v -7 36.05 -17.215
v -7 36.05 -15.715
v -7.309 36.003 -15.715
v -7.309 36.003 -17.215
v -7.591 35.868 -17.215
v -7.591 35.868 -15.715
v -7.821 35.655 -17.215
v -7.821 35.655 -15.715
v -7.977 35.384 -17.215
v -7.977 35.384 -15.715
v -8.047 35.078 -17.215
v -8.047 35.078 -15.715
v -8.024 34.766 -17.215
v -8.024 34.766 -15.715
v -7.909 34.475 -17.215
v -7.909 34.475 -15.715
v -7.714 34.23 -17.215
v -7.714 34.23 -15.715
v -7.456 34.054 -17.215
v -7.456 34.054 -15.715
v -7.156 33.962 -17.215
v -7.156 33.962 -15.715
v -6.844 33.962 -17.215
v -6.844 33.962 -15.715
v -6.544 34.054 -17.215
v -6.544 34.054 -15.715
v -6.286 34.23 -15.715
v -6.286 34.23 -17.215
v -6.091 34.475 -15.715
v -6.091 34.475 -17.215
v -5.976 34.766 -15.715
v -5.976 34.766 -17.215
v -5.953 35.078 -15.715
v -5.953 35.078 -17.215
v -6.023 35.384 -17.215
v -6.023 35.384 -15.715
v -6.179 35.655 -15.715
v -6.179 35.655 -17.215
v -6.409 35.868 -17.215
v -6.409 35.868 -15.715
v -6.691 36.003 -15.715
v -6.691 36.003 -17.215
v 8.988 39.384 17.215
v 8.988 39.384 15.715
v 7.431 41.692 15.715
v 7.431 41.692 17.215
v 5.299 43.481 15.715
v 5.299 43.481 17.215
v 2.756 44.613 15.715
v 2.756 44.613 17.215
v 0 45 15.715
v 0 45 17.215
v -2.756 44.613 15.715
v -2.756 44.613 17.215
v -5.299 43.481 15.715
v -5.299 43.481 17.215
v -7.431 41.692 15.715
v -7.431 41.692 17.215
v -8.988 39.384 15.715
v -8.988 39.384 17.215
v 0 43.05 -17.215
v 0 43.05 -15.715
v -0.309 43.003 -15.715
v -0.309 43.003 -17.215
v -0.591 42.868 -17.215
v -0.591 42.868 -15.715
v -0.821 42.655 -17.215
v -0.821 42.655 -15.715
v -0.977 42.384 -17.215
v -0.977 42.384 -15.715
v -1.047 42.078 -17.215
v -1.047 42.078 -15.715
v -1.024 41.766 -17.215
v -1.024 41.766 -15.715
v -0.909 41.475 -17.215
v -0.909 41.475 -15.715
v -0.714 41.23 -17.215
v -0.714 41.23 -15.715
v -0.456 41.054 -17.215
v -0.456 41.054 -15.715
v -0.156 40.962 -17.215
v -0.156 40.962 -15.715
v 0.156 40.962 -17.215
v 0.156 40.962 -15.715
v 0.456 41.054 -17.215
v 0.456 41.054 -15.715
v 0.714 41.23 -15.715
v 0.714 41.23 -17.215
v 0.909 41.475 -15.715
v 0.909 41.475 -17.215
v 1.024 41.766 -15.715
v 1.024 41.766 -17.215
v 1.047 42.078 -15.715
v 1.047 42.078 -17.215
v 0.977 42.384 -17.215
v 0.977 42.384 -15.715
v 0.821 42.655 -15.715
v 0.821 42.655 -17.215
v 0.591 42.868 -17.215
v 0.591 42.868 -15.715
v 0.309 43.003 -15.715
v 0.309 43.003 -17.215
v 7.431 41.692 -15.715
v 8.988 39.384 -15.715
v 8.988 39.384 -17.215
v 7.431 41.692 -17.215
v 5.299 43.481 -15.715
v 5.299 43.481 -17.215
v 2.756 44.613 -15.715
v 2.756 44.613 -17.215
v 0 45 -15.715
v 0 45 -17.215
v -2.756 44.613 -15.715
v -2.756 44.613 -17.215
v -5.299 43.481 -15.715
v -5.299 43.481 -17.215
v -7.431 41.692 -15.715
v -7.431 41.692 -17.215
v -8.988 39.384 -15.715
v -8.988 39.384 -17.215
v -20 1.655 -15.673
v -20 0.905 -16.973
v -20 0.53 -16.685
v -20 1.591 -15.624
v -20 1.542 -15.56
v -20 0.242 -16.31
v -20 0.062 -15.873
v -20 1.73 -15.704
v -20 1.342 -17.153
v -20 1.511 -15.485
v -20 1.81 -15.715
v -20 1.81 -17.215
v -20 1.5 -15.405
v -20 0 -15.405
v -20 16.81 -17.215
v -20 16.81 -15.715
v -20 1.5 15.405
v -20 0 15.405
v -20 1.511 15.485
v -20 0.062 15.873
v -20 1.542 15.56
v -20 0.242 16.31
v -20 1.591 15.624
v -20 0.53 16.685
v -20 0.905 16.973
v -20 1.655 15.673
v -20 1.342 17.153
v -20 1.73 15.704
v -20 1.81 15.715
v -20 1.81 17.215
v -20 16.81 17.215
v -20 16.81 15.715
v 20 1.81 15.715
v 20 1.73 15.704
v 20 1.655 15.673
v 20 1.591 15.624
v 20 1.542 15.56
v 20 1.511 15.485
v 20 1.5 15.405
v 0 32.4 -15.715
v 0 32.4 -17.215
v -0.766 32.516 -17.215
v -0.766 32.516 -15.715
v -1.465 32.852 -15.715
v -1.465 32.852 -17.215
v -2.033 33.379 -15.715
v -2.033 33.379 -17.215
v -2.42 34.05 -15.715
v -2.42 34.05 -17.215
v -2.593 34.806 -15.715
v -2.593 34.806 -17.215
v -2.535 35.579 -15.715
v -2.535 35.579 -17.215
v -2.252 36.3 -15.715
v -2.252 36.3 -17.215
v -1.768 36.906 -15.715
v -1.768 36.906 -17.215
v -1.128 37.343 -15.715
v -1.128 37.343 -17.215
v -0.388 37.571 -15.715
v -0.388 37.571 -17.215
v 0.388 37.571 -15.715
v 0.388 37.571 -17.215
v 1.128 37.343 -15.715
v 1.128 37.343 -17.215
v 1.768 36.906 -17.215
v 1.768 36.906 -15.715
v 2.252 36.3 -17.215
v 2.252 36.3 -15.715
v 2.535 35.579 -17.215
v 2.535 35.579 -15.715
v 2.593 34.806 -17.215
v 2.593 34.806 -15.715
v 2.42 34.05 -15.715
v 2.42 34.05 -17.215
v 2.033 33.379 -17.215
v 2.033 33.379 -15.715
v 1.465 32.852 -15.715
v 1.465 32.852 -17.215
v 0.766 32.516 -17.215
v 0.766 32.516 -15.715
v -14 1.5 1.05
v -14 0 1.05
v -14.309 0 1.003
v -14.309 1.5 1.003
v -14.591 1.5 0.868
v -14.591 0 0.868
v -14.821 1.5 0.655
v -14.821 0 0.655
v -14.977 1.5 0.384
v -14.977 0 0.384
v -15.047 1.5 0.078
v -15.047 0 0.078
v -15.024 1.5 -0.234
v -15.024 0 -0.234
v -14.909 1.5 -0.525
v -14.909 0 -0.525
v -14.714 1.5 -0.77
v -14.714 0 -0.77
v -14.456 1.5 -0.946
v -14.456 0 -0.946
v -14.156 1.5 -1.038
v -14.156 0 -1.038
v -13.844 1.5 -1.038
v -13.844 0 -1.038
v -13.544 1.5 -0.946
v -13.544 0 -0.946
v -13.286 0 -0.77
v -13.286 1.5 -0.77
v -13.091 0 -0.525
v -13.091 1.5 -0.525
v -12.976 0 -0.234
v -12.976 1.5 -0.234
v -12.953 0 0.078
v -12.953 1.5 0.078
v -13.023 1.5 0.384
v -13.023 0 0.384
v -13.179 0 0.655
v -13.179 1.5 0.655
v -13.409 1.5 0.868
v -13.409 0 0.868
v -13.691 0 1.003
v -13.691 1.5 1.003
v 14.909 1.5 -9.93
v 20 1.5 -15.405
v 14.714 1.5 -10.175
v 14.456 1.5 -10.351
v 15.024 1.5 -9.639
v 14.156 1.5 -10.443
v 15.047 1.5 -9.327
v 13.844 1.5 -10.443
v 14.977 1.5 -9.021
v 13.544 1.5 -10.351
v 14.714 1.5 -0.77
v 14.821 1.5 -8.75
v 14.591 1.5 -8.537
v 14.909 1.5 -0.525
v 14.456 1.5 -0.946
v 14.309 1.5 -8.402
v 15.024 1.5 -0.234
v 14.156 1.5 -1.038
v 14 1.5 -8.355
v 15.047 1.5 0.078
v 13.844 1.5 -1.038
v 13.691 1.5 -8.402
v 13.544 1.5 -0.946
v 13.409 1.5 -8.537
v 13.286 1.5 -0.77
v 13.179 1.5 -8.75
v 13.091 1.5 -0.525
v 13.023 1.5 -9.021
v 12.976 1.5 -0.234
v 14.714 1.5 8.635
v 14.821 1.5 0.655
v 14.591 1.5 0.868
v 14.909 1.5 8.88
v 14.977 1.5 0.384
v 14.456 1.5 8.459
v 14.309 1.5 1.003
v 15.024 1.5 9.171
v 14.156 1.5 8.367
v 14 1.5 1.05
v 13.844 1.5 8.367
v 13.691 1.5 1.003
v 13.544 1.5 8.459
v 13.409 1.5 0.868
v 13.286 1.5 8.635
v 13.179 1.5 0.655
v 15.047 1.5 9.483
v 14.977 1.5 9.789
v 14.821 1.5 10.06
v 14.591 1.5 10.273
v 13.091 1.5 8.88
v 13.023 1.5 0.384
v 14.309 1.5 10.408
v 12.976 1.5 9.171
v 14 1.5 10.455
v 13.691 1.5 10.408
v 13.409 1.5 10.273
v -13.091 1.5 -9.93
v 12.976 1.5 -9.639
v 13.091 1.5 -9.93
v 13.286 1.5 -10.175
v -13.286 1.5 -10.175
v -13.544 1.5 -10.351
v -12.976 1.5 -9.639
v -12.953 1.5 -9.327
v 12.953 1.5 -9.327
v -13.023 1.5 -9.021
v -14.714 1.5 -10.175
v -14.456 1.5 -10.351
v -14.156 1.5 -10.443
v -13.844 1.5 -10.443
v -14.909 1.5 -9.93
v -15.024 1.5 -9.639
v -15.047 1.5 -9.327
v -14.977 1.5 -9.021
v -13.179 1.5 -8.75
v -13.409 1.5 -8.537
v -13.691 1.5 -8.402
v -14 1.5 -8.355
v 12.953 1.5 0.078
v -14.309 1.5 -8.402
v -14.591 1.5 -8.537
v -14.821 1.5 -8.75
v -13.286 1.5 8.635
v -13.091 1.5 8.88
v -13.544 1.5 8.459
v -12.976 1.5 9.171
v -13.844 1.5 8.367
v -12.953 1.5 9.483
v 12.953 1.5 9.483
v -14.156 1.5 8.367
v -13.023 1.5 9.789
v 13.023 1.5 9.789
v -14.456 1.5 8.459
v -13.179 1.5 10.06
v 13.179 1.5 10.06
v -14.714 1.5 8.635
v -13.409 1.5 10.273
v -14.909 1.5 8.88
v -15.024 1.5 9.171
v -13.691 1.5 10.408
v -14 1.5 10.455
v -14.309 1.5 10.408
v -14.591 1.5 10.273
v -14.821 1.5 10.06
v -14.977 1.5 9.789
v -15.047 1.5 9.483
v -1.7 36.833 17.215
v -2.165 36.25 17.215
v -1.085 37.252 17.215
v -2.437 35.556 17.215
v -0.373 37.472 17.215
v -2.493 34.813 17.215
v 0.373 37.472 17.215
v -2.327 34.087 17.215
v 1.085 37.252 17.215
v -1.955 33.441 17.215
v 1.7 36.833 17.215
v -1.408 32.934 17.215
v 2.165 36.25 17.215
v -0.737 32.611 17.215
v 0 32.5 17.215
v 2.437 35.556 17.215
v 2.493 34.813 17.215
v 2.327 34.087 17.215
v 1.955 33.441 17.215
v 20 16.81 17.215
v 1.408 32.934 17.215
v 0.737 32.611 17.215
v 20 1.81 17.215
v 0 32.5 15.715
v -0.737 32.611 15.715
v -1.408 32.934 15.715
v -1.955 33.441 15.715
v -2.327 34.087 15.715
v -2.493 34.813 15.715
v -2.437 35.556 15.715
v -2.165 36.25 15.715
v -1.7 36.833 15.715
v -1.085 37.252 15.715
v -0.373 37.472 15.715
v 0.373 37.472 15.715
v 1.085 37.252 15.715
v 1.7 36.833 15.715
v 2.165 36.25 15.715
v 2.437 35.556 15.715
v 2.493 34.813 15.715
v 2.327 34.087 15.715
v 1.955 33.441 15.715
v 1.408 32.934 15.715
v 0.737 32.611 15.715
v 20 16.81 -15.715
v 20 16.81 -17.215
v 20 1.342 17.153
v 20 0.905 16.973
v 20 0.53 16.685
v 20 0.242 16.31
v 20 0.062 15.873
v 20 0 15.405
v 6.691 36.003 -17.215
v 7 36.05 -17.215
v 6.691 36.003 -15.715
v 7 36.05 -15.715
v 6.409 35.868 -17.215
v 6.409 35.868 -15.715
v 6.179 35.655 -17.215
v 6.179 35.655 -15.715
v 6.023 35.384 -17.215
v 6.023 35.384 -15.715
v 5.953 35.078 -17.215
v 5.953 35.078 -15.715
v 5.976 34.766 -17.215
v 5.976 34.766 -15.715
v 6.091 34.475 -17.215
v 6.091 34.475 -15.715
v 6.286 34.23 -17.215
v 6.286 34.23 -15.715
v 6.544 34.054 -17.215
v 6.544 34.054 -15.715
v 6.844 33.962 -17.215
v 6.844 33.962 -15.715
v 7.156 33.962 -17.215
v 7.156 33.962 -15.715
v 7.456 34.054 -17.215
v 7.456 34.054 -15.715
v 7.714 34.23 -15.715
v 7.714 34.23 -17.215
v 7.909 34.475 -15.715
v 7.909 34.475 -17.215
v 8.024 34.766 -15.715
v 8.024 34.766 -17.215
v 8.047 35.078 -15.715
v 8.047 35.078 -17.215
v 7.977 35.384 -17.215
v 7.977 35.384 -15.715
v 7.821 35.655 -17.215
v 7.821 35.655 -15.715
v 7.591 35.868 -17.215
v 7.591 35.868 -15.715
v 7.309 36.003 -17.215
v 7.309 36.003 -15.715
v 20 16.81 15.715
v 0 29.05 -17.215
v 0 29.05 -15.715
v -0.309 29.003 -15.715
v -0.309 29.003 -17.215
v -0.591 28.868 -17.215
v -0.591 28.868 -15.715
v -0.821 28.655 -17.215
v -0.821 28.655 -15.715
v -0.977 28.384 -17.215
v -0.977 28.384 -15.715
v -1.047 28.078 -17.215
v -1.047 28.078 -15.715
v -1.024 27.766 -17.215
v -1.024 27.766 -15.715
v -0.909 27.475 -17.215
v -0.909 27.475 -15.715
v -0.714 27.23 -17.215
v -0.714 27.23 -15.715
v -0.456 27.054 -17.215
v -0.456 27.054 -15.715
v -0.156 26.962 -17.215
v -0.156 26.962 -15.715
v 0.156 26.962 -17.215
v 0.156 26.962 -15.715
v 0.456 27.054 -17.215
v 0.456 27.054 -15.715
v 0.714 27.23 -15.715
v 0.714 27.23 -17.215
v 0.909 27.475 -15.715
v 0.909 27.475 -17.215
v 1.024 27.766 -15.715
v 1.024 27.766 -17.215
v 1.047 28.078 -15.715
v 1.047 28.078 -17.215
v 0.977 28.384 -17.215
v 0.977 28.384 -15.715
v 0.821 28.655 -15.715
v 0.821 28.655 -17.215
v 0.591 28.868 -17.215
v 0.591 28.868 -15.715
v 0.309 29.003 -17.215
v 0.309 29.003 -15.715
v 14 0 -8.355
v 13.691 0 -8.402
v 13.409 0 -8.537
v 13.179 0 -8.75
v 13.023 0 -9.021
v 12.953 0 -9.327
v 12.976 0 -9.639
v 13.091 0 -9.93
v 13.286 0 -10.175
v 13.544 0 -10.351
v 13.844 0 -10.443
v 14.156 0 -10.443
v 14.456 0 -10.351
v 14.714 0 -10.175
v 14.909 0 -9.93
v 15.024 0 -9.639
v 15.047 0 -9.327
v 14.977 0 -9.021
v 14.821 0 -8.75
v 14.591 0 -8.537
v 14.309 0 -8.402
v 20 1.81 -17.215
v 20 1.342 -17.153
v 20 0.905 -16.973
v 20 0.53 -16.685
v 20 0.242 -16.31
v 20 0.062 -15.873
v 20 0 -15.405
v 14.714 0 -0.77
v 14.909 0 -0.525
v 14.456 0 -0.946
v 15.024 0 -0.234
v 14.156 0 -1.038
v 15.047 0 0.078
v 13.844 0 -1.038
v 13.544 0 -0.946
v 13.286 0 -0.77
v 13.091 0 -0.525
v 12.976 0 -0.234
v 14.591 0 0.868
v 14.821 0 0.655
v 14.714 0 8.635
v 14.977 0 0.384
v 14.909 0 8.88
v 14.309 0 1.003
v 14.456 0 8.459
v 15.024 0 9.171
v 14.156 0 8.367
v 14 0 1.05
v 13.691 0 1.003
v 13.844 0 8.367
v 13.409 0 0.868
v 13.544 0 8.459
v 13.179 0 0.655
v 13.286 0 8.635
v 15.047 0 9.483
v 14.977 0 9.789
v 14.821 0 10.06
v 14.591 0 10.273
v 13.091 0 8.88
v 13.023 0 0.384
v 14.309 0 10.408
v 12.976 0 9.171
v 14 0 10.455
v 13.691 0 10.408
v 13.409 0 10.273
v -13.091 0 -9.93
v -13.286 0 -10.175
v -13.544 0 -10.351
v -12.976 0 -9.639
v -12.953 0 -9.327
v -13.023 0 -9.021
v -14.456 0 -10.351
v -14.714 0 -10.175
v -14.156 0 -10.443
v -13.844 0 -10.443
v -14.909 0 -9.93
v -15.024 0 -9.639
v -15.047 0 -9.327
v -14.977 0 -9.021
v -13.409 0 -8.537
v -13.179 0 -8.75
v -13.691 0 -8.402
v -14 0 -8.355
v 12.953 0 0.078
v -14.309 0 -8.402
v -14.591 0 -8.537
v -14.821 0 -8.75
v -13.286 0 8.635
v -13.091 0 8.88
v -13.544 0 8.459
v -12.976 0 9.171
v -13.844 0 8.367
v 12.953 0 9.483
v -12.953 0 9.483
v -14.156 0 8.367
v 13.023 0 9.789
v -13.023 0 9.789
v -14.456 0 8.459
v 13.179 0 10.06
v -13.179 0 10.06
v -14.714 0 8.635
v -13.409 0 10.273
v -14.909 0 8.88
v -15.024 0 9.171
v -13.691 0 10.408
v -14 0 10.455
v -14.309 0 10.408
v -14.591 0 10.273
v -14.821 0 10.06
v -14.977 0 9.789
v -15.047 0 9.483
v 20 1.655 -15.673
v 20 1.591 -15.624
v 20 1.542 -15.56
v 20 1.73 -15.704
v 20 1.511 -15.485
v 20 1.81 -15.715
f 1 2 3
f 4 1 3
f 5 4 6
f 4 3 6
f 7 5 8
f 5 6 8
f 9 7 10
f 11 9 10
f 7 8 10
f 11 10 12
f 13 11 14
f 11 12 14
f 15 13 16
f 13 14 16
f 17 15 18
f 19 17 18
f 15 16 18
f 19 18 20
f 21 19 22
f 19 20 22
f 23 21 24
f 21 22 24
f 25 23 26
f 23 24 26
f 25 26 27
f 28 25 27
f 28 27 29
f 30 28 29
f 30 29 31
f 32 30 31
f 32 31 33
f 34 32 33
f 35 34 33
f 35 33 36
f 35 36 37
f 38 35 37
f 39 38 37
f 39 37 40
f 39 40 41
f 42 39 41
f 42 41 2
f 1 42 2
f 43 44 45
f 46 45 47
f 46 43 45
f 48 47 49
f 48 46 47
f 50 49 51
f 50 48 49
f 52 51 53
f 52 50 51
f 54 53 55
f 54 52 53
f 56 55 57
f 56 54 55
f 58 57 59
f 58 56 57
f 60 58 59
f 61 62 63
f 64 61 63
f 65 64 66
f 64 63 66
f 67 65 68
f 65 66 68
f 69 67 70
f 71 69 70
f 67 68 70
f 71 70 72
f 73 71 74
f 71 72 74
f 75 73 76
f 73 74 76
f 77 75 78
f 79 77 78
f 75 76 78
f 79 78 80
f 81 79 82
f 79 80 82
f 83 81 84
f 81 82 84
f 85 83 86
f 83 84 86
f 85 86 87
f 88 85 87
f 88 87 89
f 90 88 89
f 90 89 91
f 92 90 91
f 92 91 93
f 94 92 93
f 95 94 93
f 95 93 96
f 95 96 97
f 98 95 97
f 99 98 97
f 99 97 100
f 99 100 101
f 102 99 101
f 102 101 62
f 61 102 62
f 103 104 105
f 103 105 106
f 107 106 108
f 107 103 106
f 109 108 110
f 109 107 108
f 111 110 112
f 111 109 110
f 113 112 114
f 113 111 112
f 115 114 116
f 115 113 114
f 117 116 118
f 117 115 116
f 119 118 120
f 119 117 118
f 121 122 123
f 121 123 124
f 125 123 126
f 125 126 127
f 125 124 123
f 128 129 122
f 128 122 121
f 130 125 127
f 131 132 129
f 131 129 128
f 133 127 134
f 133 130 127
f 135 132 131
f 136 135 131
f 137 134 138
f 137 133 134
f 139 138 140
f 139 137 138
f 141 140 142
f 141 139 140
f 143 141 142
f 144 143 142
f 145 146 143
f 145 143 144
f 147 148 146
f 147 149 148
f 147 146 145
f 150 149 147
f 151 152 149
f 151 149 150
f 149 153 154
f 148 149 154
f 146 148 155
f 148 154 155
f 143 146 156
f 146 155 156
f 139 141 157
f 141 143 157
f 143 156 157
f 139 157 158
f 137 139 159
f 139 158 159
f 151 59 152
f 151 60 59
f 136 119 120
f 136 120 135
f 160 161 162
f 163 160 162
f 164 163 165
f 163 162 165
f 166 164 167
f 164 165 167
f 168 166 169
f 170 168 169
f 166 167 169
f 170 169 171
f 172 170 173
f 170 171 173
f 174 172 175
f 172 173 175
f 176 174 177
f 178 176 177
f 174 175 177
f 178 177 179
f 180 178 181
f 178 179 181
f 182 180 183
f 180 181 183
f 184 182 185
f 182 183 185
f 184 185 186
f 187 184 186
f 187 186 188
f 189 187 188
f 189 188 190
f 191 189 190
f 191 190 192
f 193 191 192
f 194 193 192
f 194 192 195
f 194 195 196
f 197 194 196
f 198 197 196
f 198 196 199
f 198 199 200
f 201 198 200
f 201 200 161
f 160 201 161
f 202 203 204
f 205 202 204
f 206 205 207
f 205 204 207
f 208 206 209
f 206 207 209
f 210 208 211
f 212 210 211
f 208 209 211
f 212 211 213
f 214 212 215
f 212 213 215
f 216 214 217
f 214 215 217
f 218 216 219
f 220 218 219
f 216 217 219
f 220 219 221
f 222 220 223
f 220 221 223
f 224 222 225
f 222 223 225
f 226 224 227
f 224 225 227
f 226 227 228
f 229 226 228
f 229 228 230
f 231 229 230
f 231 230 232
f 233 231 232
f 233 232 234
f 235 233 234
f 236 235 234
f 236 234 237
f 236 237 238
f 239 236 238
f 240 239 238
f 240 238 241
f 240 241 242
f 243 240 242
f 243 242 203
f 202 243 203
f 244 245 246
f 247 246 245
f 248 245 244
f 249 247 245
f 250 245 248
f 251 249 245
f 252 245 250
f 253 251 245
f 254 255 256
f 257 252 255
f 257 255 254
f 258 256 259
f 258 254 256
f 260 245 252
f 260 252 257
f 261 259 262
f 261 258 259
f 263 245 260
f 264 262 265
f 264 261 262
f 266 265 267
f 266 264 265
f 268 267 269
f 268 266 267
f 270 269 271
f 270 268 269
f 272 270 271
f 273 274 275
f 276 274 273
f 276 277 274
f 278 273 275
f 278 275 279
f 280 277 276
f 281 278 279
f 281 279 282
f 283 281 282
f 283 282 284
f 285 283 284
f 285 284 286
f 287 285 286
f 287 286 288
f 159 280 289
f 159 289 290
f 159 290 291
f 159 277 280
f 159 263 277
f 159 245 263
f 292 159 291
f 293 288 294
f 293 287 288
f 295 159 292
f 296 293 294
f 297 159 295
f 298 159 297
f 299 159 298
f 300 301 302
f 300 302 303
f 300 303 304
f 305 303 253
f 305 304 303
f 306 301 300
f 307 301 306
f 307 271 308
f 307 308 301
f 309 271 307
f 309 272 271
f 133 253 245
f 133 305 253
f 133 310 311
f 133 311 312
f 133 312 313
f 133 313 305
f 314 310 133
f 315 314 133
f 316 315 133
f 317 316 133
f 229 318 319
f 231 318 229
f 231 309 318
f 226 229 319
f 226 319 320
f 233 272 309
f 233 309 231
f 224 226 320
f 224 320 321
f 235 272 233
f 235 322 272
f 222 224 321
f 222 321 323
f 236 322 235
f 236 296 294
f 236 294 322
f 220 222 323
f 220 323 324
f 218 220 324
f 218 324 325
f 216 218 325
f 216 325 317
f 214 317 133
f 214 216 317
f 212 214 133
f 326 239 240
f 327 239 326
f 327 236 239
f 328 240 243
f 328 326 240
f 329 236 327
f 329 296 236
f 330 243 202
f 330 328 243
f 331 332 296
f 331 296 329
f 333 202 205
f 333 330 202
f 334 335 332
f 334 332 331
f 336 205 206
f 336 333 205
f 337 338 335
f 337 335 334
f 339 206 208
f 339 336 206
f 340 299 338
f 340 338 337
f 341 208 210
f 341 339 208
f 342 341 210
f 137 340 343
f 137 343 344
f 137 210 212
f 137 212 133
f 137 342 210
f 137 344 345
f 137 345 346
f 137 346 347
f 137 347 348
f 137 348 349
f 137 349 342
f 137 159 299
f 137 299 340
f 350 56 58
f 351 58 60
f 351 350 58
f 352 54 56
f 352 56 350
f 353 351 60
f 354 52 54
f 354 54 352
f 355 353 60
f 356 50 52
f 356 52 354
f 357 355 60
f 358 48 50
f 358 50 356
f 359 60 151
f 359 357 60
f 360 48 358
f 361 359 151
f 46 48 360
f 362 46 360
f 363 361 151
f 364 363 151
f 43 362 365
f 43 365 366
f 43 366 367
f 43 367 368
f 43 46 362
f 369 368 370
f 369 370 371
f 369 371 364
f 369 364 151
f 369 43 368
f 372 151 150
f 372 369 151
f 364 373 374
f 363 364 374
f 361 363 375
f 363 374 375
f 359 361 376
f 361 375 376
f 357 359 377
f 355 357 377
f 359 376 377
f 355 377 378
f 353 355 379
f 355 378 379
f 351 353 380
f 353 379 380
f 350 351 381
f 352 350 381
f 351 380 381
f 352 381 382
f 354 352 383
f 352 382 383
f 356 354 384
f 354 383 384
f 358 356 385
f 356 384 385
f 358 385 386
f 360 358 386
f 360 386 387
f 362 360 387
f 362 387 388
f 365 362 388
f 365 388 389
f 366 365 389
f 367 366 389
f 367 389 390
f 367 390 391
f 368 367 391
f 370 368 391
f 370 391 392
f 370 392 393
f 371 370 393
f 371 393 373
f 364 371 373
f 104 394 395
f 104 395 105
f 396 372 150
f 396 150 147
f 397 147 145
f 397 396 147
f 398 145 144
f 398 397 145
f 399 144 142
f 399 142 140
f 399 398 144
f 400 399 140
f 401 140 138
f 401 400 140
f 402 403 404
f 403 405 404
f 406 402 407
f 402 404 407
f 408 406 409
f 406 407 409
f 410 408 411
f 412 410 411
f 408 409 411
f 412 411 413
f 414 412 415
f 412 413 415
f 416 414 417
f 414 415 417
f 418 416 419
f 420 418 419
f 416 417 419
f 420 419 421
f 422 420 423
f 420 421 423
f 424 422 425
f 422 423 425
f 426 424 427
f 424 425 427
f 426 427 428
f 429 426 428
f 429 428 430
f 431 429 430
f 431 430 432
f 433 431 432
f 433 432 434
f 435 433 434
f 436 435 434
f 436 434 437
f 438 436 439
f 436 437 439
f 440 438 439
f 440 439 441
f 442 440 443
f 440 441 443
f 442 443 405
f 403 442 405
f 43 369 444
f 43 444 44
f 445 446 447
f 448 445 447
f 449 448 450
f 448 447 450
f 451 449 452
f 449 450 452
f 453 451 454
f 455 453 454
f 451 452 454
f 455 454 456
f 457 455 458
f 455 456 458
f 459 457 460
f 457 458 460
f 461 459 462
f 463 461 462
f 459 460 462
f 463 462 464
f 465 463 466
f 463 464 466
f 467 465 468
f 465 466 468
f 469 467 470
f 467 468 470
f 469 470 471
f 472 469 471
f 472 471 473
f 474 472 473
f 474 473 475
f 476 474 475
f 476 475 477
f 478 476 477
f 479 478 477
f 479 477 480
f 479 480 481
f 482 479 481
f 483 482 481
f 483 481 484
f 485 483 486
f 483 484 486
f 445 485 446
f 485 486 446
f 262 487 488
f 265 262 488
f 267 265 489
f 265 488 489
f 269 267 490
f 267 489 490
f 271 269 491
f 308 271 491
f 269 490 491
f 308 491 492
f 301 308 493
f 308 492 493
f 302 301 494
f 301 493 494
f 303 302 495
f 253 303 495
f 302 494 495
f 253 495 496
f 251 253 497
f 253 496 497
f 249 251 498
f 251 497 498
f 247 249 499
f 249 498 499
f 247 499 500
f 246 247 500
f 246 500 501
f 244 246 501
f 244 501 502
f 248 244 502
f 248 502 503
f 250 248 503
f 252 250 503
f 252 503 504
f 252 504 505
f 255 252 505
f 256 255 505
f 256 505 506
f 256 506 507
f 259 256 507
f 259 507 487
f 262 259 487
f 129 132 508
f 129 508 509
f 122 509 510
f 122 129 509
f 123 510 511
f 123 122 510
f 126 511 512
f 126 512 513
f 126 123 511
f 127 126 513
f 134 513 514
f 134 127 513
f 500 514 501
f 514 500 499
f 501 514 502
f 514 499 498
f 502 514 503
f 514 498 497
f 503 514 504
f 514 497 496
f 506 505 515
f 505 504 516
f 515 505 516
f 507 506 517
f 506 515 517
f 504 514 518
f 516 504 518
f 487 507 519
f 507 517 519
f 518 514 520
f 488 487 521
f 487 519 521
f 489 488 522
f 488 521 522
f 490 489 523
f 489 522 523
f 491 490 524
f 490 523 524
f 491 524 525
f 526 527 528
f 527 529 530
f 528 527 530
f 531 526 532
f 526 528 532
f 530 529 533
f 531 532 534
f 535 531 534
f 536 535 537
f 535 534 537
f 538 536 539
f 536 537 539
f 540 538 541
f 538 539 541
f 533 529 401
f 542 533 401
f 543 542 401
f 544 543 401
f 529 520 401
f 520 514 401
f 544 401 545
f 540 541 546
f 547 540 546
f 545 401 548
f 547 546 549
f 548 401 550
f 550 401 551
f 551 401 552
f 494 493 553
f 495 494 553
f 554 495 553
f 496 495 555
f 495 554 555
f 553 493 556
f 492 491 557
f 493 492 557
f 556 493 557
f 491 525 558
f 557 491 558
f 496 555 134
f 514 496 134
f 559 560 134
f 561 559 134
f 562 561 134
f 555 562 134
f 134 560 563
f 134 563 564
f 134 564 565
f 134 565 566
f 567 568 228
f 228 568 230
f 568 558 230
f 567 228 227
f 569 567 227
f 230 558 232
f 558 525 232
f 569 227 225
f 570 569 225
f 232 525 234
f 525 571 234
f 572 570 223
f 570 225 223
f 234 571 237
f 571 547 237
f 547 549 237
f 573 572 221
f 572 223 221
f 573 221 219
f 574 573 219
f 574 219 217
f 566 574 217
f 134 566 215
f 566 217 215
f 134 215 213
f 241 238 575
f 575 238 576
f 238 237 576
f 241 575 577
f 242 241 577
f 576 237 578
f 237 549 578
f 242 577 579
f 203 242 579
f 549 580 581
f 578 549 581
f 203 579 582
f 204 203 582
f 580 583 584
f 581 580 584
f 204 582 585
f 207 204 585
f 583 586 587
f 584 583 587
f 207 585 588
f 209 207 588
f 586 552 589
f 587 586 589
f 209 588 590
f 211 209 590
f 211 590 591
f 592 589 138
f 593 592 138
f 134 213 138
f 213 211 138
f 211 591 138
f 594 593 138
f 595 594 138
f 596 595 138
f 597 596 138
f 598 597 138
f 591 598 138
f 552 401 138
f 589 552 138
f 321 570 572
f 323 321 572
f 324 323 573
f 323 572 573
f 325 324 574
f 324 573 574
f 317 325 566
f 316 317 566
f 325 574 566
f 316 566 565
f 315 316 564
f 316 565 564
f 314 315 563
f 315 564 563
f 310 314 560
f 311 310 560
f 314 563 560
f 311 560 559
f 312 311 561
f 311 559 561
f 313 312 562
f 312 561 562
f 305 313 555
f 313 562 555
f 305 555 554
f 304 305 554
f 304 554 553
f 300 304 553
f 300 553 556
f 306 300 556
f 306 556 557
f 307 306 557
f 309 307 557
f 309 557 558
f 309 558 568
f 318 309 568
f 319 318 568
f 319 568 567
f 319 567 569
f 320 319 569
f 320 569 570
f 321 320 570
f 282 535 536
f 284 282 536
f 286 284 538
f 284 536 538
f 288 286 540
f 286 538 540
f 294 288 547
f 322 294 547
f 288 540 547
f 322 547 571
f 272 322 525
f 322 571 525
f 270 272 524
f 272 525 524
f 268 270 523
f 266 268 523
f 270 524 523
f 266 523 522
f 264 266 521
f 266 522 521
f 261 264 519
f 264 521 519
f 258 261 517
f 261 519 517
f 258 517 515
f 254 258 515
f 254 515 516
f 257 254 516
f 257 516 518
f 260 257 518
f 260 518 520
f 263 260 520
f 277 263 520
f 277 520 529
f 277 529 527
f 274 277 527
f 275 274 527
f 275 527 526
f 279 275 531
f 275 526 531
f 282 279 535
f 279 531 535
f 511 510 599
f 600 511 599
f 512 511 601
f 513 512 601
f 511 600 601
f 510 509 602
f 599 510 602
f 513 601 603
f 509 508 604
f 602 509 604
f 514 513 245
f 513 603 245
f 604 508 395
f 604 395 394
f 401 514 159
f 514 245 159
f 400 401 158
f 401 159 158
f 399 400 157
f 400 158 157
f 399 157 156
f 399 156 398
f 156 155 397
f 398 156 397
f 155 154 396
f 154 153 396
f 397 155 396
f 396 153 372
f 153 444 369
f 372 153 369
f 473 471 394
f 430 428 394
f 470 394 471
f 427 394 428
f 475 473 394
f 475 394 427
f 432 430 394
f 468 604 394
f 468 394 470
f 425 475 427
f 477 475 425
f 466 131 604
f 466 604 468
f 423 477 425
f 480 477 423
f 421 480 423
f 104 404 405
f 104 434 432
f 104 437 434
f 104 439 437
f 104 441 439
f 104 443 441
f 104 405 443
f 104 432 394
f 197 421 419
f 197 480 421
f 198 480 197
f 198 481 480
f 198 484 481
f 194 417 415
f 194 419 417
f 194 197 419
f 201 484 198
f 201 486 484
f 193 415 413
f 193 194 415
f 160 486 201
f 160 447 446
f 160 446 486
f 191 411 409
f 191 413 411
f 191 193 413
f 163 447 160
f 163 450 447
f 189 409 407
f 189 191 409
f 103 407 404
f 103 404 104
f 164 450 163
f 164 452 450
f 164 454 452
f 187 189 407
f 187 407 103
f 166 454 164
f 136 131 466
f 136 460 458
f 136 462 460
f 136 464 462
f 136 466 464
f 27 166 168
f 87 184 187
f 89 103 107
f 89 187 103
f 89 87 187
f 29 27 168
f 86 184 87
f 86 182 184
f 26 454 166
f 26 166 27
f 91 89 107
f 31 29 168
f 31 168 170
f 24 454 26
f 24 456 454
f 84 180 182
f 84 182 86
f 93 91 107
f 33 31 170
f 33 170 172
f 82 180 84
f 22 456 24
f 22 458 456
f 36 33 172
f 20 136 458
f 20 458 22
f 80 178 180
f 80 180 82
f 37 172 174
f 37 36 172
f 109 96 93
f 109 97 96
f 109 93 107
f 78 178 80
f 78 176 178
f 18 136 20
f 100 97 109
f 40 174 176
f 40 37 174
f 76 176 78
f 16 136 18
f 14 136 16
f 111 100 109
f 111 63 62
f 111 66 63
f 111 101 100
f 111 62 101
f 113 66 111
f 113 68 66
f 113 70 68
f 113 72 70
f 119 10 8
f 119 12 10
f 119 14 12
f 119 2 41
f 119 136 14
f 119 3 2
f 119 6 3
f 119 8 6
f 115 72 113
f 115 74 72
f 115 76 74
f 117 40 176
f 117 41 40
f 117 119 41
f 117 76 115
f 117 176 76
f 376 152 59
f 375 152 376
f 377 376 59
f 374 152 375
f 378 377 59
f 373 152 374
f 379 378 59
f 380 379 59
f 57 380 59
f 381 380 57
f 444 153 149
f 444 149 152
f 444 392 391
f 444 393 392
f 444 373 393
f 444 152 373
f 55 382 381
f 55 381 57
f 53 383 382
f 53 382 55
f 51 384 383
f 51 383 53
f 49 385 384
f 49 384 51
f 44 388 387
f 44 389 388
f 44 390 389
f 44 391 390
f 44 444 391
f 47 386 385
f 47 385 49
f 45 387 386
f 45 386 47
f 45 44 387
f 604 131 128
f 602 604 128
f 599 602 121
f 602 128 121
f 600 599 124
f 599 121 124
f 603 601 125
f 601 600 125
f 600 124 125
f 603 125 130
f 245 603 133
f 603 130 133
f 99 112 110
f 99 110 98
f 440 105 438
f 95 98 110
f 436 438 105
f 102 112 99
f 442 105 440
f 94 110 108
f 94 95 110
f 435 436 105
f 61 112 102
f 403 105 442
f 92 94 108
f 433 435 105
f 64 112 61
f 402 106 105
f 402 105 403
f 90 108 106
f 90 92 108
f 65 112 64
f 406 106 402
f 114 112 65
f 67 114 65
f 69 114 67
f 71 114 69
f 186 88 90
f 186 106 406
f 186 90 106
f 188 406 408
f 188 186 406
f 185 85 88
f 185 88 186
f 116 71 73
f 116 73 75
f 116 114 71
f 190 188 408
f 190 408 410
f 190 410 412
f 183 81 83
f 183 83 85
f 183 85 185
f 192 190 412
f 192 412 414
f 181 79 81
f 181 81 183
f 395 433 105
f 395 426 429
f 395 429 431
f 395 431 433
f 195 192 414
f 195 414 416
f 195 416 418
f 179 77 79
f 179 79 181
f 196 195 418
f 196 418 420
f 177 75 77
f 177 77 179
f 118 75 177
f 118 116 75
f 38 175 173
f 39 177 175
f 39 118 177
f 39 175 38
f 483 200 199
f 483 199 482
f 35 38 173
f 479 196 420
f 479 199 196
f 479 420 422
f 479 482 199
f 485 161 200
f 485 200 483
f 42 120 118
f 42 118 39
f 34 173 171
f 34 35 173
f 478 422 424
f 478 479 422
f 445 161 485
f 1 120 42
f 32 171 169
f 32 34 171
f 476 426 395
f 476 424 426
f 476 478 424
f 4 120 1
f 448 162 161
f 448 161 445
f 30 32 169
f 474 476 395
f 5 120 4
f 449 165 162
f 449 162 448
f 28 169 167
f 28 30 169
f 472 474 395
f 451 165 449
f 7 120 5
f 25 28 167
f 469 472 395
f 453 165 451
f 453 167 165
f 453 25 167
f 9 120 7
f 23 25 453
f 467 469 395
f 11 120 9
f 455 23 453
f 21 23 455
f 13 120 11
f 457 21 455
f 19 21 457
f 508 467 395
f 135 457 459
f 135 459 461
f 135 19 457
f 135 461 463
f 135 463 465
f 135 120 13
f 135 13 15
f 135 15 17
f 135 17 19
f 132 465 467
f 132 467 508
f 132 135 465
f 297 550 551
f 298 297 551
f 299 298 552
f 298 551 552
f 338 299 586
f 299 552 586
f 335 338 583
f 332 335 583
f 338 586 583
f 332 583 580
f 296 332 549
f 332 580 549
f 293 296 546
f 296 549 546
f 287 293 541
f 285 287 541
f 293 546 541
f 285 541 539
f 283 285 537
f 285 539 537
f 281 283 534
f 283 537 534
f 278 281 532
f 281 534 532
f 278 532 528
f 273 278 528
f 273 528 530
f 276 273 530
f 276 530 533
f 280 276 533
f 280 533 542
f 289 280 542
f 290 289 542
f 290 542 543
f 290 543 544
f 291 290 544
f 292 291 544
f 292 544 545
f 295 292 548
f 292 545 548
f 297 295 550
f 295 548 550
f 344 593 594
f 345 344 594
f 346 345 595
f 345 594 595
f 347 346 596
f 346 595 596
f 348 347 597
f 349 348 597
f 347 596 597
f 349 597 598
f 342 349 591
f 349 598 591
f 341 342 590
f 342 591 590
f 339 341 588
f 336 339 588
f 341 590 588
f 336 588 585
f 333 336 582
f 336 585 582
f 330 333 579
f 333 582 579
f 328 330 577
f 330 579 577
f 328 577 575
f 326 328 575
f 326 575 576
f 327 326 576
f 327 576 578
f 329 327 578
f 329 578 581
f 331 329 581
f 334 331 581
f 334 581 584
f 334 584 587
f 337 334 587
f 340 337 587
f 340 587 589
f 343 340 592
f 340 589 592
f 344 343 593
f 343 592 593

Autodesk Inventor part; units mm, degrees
ref_plane "YZ Plane" through (0, 0, 0) normal (1, 0, 0) x (0, 1, 0)
ref_plane "XZ Plane" through (0, 0, 0) normal (0, 1, 0) x (-1, 0, 0)
ref_plane "XY Plane" through (0, 0, 0) normal (0, 0, 1) x (1, 0, 0)
sketch "Sketch1" plane through (0, 0, 0) normal (0, 1, 0) x (-1, 0, 0)
  line L0 (20, -15.715) -> (-20, -15.715)
  line L1 (-20, -15.715) -> (-20, 15.715)
  line L2 (-20, 15.715) -> (20, 15.715)
  line L3 (20, 15.715) -> (20, -15.715)
  point P0 (0, 0)
  dimension "d0" = 40
  dimension "d1" = 20
  dimension "d2" = 31.43
  dimension "d3" = 15.715
extrude "Plate1" add sketch "Sketch1" along normal blind 1.5
sketch "Sketch2" plane through (20, 0, 17.215) normal (0, 0, -1) x (-1, 0, 0)
  line L0 (40, 0) -> (0, 0)
  line L1 (0, 0) -> (0, 45)
  line L2 (0, 45) -> (40, 45)
  line L3 (40, 45) -> (40, 0)
edge flange "Flange1" height 45 angle 90 thickness 1.5 bend radius 0.31 thickness toward (0, 0, -1) relief tear relief width 1.5 relief depth 0.75 edges at (0, 1.5, 15.715) wall of the first edge with corners at (-20, 0, 17.215) (20, 0, 17.215) (20, 45, 17.215) (-20, 45, 17.215)
bend "Bend1"
corner "Corner1"
sketch "Sketch3" plane through (-20, 0, -17.215) normal (0, 0, 1) x (1, 0, 0)
  line L0 (40, 0) -> (0, 0)
  line L1 (0, 0) -> (0, 45)
  line L2 (0, 45) -> (40, 45)
  line L3 (40, 45) -> (40, 0)
edge flange "Flange2" height 45 angle 90 thickness 1.5 bend radius 0.31 thickness toward (0, 0, 1) relief tear relief width 1.5 relief depth 0.75 edges at (0, 1.5, -15.715) wall of the first edge with corners at (20, 0, -17.215) (-20, 0, -17.215) (-20, 45, -17.215) (20, 45, -17.215)
bend "Bend2"
corner "Corner2"
sketch "Sketch4" plane through (-20, 45, 17.215) normal (0, 0, 1) x (1, 0, 0)
  line L0 (0, -43.19) -> (0, 0) projected
  line L1 (0, 0) -> (40, 0) projected
  line L2 (40, 0) -> (40, -43.19) projected
  line L3 (0, -43.19) -> (40, -43.19) projected
  arc A0 (28.9876, -5.6156) -> (11.0124, -5.6156) centre (20, -10) ccw
  line L4 (0, -38.19) -> (40, -38.19)
  line L5 (40, -38.19) -> (40, -28.19)
  line L6 (40, -28.19) -> (0, -28.19)
  line L7 (0, -28.19) -> (0, -38.19)
  line L8 (40, -28.19) -> (28.9876, -5.6156)
  line L9 (11.0124, -5.6156) -> (0, -28.19)
  point P0 (0, -28.19)
  point P1 (20, 0)
  point P2 (40, -28.19)
  dimension "d50" = 10
  dimension "d51" = 20
  dimension "d52" = 20
  dimension "d53" = 38.19
  dimension "d54" = 10
  dimension "d55" = 40
  dimension "d56" = 40
extrude "Extrusion1" cut sketch "Sketch4" against normal blind 50 contours L0 L1 A0 L9 | L8 A0 L1 L2
sketch "Sketch6" plane through (-20, 1.81, 17.215) normal (0, 0, 1) x (1, 0, 0)
  arc A0 (28.9876, 37.5744) -> (11.0124, 37.5744) centre (20, 33.19) ccw projected
  point P0 (20, -1.81)
hole "Hole2" at (0, 35, 17.215) direction (0, 0, -1) diameter 5 depth 1.5 clearance for "Hex Head Bolt" size "M5" standard "Ansi Metric M Profile"
sketch "Sketch7" plane through (-20, 1.81, -15.715) normal (0, 0, 1) x (1, 0, 0)
  arc A0 (28.9876, 37.5744) -> (11.0124, 37.5744) centre (20, 33.19) ccw projected
  point P0 (20, -1.81)
hole "Hole3" at (0, 35, -15.715) direction (0, 0, -1) diameter 5.2 depth 1.5 clearance for "Hex Head Bolt" size "M5" standard "Ansi Metric M Profile"
sketch "Sketch8" plane through (0, 1.5, 0) normal (0, 1, 0) x (1, 0, 0)
  line L0 (20, 15.405) -> (20, -15.405) projected
  line L1 (20, -15.715) -> (-20, -15.715) projected
  line L2 (-20, -15.405) -> (20, -15.405) projected
  line L3 (20, 15.405) -> (-20, 15.405) projected
  point P0 (0, 0)
  point P1 (14, -9.405)
  point P2 (-14, -9.405)
  point P3 (14, 0)
  point P4 (-14, 0)
  point P5 (14, 9.405)
  point P6 (-14, 9.405)
  dimension "d71" = 6
  dimension "d73" = 6
  dimension "d76" = 28
  dimension "d79" = 9.405
hole "Hole4" at (14, 1.5, 9.405) at (-14, 1.5, 9.405) at (14, 1.5, 0) at (-14, 1.5, 0) at (14, 1.5, -9.405) at (-14, 1.5, -9.405) direction (0, -1, 0) diameter 2.1 depth 1.5
sketch "Sketch9" plane through (20, 1.81, -17.215) normal (0, 0, -1) x (-1, 0, 0)
  arc A0 (28.9876, 37.5744) -> (11.0124, 37.5744) centre (20, 33.19) ccw projected
  circle A1 centre (20, 40.19) radius 1.05
  circle A2 centre (13, 33.19) radius 1.05
  circle A3 centre (20, 26.19) radius 1.05
  circle A4 centre (27, 33.19) radius 1.05
  point P0 (20, -1.81)
  dimension "d89" = 7
  dimension "d90" = 0
  dimension "d91" = 2.1
  dimension "d94" = 360
hole "Hole5" at (0, 28, -17.215) at (7, 35, -17.215) at (-7, 35, -17.215) at (0, 42, -17.215) direction (0, 0, 1) diameter 2.1 depth 1.5
equation "\"d62\" = Thickness"
equation "\"d69\" = Thickness"
equation "\"d87\" = Thickness"
equation "\"d101\" = Thickness"
equation "\"d4\" = Thickness"
equation "\"d5\" = BendReliefWidth"
equation "\"d6\" = BendReliefDepth"
equation "\"d7\" = MinimumRemnant"
equation "\"d8\" = TransitionRadius"
equation "\"d11\" = BendRadius"
equation "\"d12\" = CornerReliefSize"
equation "\"d13\" = GapSize"
equation "\"d14\" = JacobiRadiusSize"
equation "\"d15\" = BendReliefWidth"
equation "\"d16\" = BendReliefDepth"
equation "\"d17\" = MinimumRemnant"
equation "\"d18\" = TransitionRadius"
equation "\"d21\" = BendRadius"
equation "\"d22\" = CornerReliefSize"
equation "\"d23\" = GapSize"
equation "\"d24\" = JacobiRadiusSize"
equation "\"BendReliefWidth\" = Thickness"
equation "\"BendReliefDepth\" = 0.5 * Thickness"
equation "\"CornerReliefSize\" = 4 * Thickness"
equation "\"MinimumRemnant\" = 2 * Thickness"
equation "\"TransitionRadius\" = BendRadius"
equation "\"JacobiRadiusSize\" = BendRadius"
equation "\"GapSize\" = Thickness"
equation "\"Thickness\" = 1.5"
equation "\"BendRadius\" = 0.31"
properties part number "axis_12_bottom_frame(top)" material "Aluminum 6061-AHC"
